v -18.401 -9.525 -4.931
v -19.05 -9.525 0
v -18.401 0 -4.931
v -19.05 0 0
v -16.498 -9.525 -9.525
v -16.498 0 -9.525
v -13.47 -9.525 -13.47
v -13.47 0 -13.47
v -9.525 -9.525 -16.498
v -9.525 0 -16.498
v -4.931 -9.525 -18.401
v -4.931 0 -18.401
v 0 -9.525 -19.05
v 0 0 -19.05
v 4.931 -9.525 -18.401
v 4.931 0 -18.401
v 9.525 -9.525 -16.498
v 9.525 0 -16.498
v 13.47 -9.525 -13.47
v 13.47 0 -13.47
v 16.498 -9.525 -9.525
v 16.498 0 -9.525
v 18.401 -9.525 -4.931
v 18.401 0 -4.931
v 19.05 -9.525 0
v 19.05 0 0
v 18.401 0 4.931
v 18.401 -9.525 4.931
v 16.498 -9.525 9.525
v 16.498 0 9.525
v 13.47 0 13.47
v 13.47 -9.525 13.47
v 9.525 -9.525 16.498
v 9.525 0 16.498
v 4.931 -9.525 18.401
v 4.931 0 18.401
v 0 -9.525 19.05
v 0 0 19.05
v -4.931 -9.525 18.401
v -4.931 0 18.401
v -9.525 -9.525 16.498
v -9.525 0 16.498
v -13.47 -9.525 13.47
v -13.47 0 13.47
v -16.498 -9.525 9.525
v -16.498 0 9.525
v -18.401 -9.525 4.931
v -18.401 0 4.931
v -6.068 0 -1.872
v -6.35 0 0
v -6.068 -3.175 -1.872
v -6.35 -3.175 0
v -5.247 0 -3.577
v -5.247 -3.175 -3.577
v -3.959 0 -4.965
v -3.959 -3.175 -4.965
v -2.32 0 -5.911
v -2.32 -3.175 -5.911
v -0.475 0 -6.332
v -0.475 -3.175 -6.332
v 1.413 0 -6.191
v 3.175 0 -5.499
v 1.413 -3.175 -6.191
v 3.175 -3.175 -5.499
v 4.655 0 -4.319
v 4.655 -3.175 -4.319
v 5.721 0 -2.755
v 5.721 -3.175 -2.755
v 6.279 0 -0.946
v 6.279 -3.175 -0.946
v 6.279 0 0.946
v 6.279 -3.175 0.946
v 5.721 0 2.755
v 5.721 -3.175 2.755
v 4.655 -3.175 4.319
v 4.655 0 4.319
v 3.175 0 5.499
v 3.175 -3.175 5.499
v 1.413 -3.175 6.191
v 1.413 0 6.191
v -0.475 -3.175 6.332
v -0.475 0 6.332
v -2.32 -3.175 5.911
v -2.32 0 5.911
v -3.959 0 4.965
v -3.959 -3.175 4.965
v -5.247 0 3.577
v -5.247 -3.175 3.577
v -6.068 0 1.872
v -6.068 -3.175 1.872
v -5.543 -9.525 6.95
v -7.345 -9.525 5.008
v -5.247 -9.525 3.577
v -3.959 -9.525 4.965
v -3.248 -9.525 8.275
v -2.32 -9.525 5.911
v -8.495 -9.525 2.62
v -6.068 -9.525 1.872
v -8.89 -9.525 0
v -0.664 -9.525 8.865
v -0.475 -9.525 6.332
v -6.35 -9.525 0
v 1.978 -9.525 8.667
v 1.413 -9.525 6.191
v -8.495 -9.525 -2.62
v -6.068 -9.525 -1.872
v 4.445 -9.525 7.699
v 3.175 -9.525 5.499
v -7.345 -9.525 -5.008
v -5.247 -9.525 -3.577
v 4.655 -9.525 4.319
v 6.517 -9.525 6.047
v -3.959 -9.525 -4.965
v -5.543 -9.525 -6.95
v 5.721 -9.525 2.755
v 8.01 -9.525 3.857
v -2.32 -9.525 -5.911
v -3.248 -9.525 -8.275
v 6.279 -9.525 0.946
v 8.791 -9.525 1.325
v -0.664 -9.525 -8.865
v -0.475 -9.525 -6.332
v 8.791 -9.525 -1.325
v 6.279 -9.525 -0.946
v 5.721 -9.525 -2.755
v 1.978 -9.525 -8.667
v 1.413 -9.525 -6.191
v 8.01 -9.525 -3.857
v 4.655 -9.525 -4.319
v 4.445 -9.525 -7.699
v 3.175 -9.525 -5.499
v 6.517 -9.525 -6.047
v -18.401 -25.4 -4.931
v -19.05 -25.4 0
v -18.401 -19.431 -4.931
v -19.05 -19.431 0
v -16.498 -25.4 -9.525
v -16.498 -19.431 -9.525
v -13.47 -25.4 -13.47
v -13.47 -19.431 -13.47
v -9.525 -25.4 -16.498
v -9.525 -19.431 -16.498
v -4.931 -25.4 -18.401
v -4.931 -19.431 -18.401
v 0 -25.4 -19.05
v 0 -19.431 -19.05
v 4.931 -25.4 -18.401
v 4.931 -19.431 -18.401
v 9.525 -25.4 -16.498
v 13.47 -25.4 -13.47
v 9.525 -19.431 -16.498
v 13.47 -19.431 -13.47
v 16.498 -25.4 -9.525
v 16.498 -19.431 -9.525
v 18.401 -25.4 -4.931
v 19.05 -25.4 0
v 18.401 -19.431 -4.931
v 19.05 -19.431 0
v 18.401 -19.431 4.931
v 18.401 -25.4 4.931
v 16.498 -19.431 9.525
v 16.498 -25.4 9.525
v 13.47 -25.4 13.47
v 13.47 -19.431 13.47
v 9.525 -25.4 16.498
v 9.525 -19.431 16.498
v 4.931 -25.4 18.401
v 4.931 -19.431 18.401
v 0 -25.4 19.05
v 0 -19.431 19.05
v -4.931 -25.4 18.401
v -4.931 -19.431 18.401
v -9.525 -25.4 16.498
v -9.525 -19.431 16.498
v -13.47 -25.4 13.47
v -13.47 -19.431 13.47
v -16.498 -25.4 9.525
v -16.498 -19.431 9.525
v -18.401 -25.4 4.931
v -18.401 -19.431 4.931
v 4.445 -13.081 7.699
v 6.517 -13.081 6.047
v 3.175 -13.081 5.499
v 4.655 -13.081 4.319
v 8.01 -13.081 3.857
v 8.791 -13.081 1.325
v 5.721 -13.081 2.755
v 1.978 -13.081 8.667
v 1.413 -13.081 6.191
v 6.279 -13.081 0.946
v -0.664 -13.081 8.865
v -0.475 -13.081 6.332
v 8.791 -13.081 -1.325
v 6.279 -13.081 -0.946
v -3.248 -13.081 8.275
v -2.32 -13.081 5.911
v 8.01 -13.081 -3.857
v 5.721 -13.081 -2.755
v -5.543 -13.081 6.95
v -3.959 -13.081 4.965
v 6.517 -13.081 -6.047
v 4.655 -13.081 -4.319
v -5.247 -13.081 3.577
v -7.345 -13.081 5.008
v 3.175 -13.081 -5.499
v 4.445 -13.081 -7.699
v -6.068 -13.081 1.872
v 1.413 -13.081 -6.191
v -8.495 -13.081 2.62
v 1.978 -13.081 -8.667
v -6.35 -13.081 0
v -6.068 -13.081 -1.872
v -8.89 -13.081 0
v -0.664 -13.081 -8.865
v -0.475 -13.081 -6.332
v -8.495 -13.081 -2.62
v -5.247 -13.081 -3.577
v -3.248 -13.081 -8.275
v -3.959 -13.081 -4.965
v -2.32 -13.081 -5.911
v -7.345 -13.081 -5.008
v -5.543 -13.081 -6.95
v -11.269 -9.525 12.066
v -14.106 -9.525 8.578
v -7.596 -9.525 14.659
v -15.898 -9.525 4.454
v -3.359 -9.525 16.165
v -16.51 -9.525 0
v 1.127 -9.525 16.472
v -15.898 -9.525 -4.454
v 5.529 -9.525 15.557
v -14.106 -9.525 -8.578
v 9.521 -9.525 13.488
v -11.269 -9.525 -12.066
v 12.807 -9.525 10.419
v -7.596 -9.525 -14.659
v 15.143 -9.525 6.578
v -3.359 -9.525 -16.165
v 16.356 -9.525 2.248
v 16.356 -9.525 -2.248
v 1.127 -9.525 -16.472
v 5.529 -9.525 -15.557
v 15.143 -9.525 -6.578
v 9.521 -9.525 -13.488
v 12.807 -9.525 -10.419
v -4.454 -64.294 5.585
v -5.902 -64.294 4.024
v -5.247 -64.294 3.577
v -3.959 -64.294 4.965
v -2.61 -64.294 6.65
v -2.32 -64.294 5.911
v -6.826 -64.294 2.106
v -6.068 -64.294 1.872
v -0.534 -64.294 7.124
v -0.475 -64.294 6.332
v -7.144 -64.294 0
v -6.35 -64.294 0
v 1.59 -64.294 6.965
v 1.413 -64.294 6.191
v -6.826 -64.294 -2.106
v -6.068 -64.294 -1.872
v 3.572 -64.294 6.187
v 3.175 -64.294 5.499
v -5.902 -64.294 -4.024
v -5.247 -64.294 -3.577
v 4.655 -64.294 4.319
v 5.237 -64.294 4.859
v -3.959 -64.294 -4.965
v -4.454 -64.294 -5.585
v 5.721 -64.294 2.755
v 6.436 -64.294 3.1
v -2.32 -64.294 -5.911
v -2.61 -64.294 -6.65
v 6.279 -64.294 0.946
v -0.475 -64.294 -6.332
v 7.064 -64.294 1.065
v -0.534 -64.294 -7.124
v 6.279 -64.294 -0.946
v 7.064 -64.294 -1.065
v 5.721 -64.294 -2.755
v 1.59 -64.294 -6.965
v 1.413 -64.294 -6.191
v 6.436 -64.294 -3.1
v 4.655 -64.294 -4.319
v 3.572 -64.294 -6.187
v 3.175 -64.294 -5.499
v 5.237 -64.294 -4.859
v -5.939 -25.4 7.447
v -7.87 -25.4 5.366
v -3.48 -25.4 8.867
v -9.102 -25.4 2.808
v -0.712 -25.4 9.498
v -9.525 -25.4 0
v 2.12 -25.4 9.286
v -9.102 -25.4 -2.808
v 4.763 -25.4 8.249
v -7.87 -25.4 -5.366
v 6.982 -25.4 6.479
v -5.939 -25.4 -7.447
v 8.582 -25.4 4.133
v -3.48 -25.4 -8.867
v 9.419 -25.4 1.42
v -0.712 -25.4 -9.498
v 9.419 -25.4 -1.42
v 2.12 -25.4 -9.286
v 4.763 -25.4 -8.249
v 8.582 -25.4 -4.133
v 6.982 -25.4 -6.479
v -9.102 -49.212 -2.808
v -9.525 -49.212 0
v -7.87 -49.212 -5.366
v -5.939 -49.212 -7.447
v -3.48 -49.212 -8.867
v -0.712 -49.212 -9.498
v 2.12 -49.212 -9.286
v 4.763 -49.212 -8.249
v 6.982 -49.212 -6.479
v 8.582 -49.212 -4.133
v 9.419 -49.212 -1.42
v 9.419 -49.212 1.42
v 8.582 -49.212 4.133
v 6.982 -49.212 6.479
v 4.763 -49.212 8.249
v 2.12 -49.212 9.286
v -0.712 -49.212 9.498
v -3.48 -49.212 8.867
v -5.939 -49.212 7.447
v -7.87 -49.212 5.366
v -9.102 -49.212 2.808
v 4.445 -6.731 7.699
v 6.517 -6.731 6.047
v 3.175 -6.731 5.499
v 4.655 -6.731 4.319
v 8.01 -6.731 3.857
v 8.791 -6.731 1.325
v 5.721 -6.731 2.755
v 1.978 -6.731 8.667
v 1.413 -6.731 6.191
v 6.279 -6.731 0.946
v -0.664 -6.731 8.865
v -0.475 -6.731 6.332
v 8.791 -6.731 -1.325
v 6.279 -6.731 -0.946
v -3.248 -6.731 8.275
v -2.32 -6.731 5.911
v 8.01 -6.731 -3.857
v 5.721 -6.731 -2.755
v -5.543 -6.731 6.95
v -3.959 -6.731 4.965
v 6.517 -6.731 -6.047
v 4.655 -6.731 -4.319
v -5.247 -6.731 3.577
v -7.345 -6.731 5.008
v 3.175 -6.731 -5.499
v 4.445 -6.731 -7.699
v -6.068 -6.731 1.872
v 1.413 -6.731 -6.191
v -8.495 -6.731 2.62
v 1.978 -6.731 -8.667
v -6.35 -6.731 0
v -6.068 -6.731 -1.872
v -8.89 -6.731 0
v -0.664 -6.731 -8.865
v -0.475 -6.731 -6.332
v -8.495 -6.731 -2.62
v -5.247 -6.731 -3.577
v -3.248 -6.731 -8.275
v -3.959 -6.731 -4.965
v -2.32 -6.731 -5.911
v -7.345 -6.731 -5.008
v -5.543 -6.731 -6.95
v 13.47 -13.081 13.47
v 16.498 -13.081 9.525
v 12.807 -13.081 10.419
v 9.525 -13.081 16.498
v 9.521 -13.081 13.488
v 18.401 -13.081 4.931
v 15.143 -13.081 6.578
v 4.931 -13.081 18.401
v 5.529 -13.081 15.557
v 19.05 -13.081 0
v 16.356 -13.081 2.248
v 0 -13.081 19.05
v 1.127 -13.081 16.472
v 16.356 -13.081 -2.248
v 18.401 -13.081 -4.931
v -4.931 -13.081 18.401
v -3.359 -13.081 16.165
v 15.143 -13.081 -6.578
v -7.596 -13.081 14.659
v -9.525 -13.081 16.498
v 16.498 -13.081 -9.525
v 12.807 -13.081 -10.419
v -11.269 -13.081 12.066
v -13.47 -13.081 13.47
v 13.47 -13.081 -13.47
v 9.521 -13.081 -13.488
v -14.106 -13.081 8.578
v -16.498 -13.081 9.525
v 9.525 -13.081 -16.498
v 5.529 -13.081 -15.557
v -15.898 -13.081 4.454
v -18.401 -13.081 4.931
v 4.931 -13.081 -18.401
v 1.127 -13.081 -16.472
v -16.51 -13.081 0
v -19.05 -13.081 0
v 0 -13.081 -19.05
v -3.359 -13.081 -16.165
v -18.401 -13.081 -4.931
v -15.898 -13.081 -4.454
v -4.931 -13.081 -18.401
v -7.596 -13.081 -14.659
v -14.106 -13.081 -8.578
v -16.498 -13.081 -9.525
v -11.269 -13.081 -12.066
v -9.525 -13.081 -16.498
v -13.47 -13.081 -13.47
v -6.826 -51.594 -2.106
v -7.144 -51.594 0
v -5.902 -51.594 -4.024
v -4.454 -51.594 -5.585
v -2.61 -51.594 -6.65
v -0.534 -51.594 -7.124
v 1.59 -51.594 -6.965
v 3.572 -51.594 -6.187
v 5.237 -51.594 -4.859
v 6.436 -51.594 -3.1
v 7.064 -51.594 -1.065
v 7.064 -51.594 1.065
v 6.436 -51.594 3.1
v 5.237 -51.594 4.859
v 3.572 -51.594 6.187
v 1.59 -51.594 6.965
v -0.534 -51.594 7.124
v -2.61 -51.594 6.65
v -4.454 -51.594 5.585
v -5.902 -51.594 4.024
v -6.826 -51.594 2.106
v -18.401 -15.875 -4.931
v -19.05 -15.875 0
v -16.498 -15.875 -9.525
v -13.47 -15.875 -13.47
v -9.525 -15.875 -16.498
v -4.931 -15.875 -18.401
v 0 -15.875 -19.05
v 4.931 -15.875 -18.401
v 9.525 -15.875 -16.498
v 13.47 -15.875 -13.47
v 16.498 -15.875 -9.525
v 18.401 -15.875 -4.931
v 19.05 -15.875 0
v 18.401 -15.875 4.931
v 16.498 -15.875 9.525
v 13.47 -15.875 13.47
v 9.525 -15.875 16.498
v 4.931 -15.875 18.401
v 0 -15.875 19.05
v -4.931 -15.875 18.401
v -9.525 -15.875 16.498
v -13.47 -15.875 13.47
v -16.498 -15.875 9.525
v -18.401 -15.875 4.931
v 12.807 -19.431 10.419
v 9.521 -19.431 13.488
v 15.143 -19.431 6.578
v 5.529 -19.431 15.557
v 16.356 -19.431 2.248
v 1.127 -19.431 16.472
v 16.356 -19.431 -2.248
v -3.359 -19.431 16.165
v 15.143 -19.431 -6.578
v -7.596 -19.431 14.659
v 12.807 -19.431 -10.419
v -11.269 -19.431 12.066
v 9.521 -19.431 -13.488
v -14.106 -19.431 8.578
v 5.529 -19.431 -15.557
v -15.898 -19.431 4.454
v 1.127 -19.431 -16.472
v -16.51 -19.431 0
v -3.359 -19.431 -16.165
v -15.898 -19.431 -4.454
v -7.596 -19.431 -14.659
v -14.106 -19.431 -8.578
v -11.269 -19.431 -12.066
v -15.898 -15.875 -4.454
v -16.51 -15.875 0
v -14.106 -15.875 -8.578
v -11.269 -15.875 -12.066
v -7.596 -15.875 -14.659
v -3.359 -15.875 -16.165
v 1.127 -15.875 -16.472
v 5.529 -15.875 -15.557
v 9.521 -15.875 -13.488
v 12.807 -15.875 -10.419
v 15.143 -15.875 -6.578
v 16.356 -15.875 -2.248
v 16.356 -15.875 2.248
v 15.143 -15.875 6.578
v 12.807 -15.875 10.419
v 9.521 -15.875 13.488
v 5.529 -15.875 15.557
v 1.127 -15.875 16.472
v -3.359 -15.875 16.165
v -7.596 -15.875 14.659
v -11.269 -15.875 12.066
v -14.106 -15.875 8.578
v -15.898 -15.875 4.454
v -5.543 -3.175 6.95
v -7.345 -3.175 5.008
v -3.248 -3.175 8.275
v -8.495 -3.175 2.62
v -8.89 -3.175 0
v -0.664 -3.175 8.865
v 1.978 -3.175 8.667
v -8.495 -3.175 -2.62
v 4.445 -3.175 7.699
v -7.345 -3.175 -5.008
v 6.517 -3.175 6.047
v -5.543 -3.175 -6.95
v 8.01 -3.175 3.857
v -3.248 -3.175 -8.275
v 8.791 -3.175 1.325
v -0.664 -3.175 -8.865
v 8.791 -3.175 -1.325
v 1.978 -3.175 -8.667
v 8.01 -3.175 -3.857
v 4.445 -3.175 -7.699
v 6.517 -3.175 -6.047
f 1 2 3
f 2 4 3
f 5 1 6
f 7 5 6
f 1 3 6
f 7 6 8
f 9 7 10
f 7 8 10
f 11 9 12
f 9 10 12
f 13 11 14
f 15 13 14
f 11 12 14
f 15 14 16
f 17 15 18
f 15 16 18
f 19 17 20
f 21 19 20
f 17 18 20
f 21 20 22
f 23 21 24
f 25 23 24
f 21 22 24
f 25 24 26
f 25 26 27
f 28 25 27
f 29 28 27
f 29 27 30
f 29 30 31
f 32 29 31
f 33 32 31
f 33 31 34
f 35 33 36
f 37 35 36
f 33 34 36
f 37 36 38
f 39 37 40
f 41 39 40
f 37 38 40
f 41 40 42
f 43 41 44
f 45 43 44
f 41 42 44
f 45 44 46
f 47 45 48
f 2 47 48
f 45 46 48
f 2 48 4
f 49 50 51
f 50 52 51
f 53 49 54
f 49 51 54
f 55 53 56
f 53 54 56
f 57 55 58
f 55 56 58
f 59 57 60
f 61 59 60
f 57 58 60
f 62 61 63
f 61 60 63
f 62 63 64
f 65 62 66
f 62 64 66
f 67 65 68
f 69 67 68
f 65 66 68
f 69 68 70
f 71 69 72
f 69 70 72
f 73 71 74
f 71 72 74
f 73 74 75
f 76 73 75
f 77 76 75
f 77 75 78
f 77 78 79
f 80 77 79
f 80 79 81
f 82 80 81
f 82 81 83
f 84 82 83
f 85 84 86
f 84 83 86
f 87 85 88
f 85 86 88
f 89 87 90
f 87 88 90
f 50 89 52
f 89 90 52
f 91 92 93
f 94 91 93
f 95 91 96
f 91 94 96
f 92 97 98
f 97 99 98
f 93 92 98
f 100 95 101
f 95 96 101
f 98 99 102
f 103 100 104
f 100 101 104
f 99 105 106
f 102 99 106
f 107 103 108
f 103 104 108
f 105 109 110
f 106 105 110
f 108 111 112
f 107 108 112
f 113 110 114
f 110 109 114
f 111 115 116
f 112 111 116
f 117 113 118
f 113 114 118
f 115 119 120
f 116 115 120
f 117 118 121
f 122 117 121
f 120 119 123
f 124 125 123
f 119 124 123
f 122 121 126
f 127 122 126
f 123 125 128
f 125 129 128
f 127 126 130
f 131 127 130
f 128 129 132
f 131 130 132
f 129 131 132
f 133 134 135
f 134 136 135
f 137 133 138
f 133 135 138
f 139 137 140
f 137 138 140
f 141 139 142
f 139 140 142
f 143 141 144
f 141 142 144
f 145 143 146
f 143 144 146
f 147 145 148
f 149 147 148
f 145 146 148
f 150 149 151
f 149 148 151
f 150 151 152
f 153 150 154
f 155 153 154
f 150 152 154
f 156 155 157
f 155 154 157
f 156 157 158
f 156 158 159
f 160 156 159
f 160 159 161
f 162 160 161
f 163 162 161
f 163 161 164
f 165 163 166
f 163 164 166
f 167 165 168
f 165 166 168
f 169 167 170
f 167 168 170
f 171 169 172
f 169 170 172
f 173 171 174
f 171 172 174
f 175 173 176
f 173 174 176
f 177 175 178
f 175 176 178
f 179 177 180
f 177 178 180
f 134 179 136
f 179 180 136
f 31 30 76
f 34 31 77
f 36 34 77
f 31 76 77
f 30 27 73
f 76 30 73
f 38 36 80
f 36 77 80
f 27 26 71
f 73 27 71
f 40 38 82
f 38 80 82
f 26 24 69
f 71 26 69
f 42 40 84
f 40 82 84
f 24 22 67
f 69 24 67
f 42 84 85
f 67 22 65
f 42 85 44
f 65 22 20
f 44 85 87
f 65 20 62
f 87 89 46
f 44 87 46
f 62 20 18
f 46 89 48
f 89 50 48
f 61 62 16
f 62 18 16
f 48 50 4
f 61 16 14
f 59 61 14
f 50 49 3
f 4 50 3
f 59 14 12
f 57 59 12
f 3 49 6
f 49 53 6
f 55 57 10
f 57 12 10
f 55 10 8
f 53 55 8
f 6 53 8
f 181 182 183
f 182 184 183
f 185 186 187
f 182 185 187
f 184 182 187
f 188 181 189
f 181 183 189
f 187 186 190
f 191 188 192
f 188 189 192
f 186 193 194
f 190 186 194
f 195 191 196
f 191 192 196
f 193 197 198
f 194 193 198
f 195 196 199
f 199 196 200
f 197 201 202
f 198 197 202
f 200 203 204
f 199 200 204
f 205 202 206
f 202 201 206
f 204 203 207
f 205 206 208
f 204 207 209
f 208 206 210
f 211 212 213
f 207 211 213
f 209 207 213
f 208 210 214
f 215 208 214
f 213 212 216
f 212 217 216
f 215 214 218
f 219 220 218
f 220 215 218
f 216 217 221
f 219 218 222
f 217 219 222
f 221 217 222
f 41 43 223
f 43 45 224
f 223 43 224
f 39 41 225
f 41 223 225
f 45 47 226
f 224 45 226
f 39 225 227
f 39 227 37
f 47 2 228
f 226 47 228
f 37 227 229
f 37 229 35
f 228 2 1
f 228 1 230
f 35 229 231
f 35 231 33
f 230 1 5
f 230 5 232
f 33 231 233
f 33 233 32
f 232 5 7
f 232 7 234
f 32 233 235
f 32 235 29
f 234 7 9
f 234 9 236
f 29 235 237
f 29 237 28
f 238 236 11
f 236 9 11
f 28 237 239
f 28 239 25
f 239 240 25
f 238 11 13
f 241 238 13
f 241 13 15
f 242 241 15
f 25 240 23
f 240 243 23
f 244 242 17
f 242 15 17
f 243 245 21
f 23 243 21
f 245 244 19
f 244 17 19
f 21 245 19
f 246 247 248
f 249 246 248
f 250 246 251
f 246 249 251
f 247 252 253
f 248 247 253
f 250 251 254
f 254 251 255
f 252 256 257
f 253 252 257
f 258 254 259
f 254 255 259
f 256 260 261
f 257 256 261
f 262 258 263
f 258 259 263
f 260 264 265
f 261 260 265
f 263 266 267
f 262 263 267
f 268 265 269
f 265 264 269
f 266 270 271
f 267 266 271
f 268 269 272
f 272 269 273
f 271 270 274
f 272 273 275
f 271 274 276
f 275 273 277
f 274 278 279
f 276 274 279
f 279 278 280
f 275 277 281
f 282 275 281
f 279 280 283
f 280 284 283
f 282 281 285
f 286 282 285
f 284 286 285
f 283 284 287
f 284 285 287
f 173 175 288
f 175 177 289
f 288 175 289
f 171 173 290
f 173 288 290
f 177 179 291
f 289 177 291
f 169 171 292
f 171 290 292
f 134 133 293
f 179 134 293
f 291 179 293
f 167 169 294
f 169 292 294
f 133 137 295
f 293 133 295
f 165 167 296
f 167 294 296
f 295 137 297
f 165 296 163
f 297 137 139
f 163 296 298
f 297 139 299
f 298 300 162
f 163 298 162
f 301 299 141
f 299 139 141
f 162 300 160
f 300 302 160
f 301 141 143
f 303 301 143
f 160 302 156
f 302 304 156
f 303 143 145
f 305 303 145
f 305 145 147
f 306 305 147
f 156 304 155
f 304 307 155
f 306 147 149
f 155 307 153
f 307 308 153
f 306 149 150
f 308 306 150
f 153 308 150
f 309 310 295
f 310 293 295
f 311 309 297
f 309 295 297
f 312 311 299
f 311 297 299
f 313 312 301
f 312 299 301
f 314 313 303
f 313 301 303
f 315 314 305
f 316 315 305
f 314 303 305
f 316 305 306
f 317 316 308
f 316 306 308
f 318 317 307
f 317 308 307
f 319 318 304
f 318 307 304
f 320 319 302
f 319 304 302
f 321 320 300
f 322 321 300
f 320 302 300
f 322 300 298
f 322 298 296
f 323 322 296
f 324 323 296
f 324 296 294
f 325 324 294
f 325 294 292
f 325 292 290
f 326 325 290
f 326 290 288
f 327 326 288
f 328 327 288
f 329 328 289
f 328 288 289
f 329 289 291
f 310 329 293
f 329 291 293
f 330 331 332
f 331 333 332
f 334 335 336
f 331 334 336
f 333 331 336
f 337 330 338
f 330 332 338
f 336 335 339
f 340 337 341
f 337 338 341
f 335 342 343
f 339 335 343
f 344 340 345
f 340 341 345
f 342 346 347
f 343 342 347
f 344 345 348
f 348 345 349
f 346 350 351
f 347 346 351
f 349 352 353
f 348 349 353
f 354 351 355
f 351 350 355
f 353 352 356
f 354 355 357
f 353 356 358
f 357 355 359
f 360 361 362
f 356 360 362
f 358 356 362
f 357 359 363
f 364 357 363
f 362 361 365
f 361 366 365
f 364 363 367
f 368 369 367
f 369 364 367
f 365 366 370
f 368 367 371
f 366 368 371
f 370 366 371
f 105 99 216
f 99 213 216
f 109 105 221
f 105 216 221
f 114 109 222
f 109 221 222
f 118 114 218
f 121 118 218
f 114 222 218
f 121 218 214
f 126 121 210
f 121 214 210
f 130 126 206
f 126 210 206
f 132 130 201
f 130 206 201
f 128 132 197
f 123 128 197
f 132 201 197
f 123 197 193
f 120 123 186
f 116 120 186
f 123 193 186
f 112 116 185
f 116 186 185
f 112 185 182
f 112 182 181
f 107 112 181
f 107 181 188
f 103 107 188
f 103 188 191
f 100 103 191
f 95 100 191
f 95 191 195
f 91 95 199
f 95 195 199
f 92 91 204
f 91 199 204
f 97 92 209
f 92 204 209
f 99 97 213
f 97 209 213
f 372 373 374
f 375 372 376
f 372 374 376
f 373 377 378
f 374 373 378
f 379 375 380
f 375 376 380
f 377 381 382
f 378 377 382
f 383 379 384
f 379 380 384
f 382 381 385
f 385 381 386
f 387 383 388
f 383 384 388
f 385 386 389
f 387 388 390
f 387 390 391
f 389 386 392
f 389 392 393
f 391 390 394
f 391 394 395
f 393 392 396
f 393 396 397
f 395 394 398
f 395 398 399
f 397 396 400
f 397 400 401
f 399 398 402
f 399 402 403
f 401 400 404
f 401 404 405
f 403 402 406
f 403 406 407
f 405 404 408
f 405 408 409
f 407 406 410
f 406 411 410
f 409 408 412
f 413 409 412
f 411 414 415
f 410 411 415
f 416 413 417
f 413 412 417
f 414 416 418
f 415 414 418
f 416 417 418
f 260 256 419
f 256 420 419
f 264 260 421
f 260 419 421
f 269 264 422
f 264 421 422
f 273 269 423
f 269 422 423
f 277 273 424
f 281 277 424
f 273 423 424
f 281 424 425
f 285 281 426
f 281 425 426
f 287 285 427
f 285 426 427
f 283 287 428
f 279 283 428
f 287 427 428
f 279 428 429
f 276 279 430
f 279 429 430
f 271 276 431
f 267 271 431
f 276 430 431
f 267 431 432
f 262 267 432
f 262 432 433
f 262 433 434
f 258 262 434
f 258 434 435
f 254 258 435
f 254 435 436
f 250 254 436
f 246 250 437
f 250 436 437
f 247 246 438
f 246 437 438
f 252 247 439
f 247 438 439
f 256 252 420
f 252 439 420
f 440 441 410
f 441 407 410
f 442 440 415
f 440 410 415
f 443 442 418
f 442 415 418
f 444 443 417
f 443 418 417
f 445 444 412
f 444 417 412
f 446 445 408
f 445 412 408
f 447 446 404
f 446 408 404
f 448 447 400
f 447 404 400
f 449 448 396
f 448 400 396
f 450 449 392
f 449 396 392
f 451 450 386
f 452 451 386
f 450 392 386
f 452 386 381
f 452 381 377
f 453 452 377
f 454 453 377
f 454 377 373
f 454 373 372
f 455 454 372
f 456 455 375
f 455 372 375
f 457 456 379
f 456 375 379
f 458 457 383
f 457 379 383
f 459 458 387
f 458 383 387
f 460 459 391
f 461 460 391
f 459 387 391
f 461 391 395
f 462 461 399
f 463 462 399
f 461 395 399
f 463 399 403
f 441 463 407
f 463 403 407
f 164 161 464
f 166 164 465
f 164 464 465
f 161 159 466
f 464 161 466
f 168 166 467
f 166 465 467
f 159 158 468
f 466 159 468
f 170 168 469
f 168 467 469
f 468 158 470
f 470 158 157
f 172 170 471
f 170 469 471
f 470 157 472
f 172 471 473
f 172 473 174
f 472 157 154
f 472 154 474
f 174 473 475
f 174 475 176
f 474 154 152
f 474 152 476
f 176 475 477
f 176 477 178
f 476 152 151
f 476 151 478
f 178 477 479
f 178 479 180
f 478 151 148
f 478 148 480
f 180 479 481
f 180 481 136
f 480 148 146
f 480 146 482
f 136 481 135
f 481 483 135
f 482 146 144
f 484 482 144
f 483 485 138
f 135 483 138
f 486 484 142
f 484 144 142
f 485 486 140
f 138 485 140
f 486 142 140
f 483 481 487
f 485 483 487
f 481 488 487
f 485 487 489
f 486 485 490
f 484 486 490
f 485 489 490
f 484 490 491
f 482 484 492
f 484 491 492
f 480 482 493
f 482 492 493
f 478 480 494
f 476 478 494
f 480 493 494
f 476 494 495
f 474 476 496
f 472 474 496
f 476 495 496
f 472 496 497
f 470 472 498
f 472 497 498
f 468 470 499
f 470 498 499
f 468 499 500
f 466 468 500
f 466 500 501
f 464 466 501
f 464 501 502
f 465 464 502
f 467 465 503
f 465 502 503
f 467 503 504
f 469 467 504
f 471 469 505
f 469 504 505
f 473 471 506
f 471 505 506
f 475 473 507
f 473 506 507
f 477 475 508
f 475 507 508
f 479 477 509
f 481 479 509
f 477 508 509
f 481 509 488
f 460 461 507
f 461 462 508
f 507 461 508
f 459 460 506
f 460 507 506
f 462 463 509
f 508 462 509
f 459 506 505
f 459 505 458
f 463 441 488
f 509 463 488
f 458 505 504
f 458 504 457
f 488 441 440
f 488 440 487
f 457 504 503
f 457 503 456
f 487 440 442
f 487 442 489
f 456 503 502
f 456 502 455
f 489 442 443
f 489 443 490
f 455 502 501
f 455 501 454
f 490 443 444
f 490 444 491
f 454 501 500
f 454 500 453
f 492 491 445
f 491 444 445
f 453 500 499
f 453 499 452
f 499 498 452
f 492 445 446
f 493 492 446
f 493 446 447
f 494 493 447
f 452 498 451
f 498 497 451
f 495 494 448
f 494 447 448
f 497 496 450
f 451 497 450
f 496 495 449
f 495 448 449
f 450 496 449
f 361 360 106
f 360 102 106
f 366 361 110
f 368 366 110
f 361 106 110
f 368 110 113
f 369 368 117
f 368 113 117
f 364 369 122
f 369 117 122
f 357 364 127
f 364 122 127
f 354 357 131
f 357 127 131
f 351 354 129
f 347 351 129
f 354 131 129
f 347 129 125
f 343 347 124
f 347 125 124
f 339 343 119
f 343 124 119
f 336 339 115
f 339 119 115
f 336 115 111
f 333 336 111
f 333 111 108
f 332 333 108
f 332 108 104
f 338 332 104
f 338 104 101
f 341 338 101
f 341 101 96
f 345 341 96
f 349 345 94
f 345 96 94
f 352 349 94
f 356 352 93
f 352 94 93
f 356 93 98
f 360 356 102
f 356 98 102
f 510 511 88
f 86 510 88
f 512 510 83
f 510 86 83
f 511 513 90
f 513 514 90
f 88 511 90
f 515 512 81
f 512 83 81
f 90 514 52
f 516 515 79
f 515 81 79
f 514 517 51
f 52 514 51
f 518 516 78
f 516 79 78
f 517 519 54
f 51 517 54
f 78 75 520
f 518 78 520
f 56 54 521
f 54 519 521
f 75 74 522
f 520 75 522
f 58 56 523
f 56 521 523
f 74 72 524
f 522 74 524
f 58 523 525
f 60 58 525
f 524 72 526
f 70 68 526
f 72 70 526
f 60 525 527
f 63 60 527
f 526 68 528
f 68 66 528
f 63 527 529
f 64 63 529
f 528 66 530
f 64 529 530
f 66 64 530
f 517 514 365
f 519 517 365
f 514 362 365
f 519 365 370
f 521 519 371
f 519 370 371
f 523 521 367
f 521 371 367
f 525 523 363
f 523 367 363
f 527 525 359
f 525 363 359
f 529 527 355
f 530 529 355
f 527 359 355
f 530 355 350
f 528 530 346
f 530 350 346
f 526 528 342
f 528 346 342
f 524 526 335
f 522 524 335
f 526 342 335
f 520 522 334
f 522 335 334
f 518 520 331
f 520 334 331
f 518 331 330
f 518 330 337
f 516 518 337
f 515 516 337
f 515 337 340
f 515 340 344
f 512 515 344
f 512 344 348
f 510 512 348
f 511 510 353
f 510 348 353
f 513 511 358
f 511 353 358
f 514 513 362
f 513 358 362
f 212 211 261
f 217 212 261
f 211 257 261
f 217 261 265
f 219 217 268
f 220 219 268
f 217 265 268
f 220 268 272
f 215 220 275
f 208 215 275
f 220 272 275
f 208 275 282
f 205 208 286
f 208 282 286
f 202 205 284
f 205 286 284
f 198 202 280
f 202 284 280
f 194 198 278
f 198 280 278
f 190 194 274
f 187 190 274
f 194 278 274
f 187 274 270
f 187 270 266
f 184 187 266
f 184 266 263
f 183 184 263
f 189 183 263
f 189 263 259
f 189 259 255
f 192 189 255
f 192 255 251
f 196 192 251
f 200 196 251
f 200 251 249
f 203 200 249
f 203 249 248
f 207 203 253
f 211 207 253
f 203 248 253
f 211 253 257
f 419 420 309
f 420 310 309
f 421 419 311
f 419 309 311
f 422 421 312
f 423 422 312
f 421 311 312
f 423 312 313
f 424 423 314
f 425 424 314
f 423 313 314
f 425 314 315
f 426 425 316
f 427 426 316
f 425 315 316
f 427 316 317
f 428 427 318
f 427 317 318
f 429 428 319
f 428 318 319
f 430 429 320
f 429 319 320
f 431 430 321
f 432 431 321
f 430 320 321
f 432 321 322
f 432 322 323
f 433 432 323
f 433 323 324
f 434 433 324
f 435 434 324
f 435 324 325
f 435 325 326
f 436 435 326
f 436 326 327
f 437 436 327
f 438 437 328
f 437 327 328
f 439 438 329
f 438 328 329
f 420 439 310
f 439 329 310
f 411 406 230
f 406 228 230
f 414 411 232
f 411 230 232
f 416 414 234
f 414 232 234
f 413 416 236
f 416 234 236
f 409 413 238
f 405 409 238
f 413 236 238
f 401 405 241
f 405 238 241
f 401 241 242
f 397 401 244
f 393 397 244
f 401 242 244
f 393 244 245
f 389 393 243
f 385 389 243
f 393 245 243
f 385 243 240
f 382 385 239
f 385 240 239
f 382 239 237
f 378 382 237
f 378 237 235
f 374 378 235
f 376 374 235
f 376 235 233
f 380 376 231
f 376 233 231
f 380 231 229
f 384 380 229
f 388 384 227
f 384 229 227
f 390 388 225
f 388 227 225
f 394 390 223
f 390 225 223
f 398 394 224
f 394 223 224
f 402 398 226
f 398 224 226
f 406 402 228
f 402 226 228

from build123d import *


with BuildPart() as part:
    # Sketch1 → Revolve1 (revolve)
    with BuildSketch(Plane.XY):
        Polygon((-6.35, -13.081), (-6.35, -64.29375), (-7.14375, -64.29375), (-7.14375, -51.59375), (-9.525, -49.2125), (-9.525, -25.4), (-19.05, -25.4), (-19.05, -19.431), (-16.51, -19.431), (-16.51, -15.875), (-19.05, -15.875), (-19.05, -13.081), (-16.51, -13.081), (-16.51, -9.525), (-19.05, -9.525), (-19.05, 0), (-6.35, 0), (-6.35, -3.175), (-8.89, -3.175), (-8.89, -6.731), (-6.35, -6.731), (-6.35, -9.525), (-8.89, -9.525), (-8.89, -13.081), align=None)
    revolve(axis=Axis((0, 0, 0), (0, -1, 0)))


solid = part.part
